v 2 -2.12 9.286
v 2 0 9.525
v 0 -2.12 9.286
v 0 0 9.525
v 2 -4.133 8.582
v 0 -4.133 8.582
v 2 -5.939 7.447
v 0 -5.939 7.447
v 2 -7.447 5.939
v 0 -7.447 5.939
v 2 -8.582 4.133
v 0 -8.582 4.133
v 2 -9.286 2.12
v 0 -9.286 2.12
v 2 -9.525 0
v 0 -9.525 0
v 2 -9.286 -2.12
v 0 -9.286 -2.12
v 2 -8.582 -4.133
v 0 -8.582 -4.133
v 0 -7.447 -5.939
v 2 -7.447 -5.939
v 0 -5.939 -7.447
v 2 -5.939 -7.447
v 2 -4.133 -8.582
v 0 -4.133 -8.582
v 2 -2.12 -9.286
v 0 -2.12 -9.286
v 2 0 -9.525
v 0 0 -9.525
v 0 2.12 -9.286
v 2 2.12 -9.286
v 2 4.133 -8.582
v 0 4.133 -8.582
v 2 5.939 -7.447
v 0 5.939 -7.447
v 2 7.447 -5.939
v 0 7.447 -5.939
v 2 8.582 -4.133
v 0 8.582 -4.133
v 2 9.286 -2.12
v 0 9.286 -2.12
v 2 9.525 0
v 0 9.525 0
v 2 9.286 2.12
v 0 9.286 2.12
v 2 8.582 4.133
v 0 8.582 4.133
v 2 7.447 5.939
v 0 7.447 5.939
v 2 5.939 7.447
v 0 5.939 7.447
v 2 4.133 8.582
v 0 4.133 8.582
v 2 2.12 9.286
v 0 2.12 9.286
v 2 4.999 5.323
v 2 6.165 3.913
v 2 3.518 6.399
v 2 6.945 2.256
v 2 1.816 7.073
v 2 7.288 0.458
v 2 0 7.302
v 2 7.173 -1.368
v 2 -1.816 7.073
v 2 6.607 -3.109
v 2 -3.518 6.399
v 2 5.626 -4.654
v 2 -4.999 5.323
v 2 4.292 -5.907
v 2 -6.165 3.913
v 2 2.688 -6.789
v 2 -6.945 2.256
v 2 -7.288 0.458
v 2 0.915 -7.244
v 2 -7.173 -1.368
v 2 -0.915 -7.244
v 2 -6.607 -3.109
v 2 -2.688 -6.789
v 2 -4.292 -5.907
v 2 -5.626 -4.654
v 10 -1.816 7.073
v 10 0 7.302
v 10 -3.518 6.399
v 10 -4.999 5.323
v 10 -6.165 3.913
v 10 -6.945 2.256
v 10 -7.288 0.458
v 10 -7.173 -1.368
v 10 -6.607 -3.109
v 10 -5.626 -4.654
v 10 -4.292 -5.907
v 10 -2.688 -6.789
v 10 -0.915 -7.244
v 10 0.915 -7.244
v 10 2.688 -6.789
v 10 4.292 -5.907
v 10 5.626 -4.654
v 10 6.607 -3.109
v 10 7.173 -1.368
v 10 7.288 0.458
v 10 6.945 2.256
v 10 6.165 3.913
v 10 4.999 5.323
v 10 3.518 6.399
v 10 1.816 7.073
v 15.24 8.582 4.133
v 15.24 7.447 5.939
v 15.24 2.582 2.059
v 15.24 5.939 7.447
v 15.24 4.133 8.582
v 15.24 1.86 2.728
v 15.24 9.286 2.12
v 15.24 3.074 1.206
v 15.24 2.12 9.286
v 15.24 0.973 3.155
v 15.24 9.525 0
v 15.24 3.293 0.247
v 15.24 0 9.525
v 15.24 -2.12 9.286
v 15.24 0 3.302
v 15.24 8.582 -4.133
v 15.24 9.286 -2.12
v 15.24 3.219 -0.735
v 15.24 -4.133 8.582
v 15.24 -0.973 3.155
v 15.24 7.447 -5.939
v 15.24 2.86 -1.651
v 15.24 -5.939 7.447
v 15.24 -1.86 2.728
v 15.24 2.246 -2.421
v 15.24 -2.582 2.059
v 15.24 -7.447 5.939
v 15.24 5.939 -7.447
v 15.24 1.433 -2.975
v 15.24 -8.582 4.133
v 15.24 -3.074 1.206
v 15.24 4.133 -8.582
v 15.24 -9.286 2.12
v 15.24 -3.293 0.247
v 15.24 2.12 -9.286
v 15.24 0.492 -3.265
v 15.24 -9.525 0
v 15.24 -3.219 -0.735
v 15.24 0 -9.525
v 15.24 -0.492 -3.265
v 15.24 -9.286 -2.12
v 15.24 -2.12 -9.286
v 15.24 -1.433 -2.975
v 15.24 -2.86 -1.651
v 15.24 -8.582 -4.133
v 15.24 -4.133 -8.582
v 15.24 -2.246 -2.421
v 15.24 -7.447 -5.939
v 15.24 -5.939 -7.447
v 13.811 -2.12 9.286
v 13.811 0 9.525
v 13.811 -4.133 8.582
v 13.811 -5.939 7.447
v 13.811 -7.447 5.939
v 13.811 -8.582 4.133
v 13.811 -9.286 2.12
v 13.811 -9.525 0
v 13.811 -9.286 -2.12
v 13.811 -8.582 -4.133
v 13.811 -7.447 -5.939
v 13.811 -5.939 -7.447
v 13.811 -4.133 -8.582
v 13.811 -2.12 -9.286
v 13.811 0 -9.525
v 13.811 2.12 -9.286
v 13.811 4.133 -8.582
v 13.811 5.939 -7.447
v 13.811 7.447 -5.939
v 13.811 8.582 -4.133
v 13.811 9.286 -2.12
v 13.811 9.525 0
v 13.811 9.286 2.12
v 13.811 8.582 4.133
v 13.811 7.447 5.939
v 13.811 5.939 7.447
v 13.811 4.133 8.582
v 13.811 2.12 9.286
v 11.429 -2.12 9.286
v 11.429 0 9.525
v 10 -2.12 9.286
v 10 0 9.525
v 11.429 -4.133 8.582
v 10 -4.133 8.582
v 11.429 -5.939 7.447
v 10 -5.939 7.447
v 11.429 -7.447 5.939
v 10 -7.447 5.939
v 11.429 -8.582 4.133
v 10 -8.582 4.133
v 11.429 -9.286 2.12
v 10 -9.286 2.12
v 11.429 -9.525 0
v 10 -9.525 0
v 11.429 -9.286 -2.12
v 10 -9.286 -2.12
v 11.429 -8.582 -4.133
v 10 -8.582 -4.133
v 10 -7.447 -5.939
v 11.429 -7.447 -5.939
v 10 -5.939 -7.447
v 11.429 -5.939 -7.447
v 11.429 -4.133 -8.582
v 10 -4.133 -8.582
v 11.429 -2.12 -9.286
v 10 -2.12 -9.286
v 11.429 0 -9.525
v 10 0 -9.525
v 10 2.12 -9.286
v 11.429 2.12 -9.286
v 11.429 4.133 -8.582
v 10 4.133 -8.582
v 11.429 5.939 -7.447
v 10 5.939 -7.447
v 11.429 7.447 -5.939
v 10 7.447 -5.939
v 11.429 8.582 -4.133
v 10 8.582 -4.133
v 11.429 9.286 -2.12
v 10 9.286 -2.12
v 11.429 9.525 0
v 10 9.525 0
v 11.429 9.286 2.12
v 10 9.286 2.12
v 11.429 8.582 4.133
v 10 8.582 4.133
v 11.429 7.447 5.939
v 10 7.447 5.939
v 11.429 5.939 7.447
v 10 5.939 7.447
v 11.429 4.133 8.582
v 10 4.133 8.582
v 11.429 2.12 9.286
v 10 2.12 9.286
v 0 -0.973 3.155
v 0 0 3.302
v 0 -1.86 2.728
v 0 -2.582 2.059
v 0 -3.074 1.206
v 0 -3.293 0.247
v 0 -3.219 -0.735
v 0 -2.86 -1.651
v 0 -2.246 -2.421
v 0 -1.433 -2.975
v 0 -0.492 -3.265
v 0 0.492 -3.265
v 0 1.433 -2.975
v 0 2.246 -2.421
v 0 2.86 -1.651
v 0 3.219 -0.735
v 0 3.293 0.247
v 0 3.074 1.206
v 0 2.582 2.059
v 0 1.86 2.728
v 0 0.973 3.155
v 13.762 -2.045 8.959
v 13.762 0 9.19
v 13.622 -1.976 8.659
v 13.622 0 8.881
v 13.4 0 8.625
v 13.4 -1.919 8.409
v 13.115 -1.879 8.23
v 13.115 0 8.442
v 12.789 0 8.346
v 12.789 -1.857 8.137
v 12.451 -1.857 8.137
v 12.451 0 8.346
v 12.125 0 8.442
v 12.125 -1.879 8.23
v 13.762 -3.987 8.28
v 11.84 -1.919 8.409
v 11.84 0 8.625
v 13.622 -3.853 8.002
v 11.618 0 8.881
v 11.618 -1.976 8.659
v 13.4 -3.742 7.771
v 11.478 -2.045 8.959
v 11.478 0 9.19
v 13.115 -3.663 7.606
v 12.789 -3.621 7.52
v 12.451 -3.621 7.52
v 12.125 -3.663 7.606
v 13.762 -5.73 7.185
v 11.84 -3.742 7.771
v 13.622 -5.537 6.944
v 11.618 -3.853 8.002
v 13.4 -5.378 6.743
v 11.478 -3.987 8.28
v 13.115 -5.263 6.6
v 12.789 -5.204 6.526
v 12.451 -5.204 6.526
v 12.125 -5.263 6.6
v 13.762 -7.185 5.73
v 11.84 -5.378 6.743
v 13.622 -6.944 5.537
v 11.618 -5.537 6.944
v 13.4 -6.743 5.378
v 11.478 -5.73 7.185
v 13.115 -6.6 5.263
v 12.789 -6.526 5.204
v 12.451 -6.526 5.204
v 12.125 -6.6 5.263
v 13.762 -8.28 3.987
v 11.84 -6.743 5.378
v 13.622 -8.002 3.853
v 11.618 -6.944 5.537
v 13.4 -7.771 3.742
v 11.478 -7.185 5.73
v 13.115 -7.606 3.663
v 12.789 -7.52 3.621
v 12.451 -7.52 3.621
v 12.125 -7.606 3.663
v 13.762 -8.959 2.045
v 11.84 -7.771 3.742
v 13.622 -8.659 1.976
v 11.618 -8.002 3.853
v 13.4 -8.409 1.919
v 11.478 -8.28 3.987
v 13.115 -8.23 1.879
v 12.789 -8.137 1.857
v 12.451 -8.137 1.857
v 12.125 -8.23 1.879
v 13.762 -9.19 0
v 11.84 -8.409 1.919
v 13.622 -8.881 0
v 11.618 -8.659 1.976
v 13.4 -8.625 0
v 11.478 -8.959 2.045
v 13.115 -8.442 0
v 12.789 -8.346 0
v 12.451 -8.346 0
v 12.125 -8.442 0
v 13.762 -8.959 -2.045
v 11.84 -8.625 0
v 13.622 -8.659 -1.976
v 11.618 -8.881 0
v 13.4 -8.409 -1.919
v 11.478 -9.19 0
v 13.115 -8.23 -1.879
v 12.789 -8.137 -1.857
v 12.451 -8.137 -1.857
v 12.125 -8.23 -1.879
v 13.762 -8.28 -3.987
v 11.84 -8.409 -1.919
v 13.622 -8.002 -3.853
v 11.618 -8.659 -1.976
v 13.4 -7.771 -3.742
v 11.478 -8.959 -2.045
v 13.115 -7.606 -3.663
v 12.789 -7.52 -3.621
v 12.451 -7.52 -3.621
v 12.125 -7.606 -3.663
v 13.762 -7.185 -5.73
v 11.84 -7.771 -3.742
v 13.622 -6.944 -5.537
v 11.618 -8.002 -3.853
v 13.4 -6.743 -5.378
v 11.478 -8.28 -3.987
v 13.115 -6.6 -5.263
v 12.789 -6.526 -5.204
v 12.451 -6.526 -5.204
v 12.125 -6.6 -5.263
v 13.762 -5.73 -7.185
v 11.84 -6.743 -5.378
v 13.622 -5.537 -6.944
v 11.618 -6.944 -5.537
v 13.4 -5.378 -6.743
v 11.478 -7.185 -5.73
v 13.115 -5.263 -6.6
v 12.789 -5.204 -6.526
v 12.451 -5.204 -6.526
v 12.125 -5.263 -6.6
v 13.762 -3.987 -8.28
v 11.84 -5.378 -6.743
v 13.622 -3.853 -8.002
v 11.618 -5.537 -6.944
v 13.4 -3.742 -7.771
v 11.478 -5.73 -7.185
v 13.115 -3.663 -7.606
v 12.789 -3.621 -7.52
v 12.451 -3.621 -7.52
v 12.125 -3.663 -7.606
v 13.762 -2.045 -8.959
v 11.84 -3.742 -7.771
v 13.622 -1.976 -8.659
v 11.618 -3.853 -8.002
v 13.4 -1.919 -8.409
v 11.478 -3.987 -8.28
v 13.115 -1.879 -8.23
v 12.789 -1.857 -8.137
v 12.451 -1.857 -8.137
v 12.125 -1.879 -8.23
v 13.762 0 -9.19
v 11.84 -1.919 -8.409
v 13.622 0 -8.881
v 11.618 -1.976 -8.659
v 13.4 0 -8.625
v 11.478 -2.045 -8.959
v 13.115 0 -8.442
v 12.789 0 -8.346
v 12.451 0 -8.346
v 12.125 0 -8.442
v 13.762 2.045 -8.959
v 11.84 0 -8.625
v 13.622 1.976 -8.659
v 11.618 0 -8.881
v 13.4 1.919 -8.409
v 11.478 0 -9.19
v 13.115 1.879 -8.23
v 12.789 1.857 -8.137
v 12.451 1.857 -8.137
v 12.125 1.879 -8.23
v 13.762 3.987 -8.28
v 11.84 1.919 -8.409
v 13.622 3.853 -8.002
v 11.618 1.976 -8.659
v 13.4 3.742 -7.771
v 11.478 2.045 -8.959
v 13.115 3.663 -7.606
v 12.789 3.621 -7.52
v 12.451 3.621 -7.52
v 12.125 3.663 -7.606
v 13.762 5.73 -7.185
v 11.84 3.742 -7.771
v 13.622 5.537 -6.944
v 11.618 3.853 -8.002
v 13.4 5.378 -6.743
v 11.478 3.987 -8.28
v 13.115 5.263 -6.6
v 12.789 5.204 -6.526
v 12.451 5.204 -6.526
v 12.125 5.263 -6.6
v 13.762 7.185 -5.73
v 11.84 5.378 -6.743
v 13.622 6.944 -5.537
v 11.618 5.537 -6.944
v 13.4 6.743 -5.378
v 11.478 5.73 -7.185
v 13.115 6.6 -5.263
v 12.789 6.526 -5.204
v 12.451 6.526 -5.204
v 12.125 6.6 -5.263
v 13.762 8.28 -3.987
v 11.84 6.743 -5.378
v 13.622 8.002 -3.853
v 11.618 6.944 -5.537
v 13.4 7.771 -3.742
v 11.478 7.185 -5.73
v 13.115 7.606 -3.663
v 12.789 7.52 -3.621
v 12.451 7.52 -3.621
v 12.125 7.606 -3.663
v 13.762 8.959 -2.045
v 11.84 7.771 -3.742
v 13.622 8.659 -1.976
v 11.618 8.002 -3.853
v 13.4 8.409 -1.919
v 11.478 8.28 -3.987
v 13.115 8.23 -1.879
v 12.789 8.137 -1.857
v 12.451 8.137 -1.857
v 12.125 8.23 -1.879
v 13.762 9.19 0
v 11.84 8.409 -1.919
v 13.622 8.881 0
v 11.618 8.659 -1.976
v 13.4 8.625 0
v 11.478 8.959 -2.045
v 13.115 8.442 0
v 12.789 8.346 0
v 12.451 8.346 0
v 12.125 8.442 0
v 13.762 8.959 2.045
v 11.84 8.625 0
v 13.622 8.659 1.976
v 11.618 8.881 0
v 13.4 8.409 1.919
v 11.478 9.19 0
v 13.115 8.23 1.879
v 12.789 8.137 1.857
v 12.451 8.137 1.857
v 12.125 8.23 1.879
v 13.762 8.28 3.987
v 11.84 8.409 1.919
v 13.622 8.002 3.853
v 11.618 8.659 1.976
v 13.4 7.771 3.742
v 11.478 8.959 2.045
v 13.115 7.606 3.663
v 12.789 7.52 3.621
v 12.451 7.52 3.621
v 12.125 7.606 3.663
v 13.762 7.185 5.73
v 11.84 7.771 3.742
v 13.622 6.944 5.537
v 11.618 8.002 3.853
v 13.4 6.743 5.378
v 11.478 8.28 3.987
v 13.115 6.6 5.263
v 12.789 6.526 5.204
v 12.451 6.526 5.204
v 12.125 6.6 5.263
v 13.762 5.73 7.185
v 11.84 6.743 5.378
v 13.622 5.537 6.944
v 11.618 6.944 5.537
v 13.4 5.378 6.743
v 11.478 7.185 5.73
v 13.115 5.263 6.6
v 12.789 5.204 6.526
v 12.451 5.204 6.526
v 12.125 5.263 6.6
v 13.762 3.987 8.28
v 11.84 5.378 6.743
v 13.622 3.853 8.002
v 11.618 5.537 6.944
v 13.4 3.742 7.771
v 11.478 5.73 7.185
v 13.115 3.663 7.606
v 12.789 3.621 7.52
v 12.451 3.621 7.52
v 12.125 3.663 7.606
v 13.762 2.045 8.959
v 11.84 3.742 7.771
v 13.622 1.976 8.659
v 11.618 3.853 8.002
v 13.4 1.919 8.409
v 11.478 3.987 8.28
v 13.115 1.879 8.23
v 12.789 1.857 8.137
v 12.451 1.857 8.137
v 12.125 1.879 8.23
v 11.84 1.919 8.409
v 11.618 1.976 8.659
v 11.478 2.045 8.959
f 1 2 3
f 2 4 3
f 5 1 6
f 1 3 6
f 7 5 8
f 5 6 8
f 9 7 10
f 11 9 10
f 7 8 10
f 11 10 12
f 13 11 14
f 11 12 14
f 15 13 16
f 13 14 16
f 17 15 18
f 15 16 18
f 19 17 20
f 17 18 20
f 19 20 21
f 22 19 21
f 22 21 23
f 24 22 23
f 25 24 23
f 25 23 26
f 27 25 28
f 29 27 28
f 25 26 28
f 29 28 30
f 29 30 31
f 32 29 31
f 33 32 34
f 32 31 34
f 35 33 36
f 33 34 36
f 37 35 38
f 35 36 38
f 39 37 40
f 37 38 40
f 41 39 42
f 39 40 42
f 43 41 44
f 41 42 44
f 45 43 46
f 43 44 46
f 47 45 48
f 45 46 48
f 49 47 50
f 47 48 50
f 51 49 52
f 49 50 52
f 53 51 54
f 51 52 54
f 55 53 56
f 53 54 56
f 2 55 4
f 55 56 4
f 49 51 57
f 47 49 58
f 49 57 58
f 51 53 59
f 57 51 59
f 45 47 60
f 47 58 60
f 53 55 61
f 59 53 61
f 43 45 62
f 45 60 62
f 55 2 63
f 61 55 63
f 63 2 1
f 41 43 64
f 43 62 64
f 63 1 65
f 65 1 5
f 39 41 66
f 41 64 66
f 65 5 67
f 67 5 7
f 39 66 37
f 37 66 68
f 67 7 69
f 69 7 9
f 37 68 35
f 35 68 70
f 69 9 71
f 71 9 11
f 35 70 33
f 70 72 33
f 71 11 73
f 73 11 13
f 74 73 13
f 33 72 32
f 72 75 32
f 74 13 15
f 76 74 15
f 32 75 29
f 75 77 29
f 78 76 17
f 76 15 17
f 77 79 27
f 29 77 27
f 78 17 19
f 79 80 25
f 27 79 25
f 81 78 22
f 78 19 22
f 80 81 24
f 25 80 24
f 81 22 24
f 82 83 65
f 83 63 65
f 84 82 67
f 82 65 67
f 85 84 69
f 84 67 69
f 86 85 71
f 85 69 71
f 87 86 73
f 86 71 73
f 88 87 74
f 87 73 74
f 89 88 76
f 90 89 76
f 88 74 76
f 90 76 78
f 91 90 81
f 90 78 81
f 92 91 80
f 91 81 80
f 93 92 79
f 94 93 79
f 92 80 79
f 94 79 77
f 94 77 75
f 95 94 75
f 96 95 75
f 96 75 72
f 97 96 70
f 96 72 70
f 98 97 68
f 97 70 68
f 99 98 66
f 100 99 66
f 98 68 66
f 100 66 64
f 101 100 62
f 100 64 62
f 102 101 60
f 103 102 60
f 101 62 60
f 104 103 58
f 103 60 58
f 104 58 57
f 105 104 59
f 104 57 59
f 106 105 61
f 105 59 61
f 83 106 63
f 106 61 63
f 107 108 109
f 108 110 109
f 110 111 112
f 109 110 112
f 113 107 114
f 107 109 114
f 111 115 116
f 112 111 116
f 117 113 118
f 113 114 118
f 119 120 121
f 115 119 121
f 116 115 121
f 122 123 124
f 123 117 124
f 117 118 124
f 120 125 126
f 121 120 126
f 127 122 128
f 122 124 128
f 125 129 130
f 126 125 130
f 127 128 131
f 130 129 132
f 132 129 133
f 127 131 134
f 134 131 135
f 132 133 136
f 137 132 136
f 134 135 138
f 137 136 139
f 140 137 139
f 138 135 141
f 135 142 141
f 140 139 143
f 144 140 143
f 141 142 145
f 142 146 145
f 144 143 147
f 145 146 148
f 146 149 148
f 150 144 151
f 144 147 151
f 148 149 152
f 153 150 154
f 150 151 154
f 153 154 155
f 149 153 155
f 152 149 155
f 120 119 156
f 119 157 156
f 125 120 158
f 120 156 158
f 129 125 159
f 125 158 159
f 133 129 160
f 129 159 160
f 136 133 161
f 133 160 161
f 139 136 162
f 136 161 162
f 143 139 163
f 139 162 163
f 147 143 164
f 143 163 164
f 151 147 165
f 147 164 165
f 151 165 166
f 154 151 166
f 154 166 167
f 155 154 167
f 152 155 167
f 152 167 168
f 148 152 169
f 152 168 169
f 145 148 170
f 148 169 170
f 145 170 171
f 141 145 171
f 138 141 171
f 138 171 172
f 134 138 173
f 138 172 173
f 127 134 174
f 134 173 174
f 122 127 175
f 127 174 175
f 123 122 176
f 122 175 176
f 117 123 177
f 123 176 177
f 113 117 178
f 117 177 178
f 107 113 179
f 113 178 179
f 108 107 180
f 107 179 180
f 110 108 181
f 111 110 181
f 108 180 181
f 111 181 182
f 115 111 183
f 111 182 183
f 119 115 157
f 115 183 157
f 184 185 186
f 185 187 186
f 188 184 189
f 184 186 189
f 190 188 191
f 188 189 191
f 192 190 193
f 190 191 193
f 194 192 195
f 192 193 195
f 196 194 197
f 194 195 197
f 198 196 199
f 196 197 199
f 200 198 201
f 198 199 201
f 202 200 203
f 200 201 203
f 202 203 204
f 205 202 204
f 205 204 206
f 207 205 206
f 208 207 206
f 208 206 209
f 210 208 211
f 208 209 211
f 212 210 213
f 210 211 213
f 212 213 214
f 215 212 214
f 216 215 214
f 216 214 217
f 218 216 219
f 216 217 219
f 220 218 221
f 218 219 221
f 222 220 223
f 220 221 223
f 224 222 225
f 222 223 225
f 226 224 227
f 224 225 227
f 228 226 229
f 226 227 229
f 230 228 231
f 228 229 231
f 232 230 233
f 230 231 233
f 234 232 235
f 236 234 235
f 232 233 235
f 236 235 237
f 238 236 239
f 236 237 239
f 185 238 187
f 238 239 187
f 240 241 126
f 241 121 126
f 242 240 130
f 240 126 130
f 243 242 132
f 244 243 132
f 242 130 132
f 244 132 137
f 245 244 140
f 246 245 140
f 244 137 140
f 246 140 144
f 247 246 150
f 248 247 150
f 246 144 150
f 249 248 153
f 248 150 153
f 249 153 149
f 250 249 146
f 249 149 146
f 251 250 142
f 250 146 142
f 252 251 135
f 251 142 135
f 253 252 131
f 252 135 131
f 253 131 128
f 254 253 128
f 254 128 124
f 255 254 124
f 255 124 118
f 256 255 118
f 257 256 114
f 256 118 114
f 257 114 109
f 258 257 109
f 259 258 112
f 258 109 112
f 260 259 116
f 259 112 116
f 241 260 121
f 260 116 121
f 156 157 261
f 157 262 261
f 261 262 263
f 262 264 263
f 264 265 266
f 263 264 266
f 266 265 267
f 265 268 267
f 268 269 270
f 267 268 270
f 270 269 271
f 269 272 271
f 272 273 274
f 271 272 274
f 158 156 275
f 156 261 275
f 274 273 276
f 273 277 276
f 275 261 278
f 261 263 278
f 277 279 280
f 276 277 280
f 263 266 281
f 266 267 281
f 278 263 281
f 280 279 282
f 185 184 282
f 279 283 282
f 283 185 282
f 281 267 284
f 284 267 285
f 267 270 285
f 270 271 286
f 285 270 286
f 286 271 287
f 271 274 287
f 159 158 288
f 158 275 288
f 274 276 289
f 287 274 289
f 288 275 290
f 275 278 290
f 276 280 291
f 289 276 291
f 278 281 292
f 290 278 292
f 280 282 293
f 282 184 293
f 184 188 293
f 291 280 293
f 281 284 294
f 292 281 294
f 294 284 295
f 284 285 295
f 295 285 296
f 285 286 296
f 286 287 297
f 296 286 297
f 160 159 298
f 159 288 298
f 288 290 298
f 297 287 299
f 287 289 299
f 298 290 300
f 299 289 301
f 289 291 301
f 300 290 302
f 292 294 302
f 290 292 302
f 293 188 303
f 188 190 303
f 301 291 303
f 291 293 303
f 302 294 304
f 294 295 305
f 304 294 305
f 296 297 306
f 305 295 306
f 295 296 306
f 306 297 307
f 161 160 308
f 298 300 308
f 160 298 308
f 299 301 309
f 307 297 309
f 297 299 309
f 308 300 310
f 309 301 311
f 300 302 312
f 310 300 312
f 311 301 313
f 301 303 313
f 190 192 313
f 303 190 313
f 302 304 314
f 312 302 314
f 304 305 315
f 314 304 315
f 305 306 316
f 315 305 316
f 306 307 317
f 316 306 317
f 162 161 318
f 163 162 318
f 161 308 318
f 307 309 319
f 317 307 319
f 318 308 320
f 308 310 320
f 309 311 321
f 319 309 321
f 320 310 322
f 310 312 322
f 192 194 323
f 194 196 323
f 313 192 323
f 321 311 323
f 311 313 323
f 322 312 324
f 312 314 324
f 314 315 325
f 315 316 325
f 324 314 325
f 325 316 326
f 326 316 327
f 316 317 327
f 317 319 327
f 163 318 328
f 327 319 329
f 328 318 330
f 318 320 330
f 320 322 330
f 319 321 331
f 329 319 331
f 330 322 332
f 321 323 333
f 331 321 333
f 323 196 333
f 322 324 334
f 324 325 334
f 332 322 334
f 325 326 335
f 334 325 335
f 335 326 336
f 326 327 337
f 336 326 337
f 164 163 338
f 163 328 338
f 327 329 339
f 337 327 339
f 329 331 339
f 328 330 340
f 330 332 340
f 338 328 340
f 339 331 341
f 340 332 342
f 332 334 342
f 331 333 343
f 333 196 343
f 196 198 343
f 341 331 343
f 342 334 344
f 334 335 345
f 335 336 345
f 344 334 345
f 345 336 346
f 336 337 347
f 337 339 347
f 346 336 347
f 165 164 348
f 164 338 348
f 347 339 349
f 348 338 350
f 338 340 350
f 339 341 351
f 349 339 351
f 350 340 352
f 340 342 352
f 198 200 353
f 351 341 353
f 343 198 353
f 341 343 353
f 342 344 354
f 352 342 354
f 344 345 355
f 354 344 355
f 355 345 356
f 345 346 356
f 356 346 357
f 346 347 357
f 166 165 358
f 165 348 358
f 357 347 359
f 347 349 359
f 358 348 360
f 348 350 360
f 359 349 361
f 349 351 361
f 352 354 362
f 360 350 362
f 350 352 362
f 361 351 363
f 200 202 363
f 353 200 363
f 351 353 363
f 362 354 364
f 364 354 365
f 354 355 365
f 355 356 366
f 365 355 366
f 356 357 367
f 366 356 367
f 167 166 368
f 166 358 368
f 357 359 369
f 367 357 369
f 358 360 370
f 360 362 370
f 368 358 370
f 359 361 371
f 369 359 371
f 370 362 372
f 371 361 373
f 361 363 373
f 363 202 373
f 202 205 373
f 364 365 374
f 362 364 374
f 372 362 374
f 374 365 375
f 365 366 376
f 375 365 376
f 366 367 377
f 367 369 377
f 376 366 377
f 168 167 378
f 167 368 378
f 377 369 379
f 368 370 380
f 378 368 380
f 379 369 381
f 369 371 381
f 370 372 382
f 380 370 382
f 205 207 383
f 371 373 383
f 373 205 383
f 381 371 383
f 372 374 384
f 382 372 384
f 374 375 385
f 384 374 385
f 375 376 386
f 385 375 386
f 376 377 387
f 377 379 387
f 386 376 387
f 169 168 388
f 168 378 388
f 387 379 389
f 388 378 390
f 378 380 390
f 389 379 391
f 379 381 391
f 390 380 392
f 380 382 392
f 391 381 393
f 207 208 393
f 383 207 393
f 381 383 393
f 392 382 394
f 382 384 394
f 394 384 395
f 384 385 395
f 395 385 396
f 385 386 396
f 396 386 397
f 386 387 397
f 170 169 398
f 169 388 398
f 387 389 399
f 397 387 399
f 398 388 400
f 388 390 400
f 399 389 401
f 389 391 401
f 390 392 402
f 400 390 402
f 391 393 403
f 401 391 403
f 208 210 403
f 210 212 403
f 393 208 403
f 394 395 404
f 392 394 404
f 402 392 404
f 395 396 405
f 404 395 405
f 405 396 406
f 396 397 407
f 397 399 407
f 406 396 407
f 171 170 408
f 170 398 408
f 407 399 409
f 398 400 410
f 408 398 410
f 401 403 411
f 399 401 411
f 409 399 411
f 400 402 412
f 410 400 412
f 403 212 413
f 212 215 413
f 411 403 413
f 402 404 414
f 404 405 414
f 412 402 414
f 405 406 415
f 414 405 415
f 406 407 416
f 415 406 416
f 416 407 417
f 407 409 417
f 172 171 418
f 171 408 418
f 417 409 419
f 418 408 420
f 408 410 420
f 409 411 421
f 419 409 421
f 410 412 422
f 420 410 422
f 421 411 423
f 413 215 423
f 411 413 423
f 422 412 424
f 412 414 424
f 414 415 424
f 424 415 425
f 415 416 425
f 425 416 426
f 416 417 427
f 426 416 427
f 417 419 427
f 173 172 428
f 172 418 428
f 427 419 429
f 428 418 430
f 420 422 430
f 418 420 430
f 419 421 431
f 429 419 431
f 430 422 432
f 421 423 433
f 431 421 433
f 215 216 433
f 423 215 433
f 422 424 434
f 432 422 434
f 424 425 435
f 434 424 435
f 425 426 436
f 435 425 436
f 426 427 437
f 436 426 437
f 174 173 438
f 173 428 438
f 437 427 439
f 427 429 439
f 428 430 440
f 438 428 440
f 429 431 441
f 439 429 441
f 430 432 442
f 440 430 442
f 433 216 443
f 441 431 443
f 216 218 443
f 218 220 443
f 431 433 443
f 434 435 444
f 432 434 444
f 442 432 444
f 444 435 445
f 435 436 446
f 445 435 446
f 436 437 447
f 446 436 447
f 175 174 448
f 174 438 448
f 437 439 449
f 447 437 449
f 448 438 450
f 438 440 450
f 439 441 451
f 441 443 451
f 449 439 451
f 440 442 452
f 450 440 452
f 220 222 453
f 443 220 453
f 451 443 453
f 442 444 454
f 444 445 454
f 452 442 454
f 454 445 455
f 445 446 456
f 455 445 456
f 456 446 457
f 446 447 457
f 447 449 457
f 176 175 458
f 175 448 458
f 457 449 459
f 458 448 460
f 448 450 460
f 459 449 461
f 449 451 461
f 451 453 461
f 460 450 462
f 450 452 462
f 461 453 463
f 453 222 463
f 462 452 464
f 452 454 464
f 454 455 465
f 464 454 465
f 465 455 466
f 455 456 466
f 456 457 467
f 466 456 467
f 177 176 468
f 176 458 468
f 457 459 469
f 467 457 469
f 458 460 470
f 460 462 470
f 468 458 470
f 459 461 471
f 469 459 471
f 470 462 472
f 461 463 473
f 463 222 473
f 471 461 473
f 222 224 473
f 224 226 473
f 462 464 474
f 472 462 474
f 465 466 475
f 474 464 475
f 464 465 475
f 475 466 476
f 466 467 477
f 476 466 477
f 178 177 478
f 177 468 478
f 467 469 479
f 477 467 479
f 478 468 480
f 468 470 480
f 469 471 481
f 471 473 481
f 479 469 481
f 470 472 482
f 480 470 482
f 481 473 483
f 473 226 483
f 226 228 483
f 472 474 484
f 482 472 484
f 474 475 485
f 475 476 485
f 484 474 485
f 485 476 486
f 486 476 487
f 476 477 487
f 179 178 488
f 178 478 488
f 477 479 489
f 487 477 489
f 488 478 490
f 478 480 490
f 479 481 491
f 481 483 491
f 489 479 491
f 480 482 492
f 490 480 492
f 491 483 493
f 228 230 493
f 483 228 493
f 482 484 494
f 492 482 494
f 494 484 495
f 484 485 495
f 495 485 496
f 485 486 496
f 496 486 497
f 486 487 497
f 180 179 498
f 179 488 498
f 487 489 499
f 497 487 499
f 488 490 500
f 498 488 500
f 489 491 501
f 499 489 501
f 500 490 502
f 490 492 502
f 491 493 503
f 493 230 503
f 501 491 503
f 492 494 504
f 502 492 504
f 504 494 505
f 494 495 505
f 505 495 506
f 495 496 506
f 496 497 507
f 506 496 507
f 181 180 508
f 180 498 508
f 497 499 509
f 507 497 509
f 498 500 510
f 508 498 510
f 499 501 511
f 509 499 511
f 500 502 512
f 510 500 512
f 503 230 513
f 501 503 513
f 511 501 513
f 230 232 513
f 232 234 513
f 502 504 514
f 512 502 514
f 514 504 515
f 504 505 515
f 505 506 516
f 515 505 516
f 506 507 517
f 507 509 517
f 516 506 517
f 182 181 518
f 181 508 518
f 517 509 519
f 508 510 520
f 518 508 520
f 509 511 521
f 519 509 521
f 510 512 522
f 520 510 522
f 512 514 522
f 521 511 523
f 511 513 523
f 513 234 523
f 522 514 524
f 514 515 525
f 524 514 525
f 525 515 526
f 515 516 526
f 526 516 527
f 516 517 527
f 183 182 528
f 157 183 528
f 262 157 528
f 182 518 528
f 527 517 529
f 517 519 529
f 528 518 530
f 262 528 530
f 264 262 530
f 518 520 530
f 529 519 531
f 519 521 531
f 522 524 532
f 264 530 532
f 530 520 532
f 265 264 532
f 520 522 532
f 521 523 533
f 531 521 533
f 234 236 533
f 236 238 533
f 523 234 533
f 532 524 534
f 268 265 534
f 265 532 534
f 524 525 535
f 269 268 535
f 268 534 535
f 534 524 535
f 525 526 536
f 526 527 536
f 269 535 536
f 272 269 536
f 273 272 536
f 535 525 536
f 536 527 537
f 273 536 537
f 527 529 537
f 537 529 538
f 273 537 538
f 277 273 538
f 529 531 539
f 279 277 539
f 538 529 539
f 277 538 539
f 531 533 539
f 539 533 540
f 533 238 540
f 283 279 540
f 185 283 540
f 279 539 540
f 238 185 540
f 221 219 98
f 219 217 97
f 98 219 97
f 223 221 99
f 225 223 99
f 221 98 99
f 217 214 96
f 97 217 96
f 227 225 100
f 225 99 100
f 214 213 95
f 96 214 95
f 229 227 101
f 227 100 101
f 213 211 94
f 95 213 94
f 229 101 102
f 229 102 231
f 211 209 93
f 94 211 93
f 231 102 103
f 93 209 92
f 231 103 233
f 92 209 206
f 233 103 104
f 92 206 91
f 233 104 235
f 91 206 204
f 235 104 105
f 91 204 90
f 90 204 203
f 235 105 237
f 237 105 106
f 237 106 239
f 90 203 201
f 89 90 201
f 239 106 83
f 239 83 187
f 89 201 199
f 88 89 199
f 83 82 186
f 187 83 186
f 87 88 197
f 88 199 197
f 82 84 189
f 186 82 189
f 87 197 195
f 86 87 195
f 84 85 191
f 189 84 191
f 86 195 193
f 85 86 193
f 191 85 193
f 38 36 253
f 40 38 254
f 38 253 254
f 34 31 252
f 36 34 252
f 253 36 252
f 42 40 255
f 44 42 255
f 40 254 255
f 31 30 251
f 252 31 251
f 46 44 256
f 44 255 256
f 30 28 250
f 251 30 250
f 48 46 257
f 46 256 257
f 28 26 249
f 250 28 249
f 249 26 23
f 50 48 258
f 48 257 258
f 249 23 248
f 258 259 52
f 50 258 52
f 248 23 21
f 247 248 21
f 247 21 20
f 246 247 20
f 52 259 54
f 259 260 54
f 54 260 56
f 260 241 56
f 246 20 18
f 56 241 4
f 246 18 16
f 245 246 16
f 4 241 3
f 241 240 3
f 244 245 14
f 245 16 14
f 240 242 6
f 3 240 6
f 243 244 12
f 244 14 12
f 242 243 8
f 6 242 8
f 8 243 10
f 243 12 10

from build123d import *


with BuildPart() as part:
    # Sketch1 → Revolve1 (revolve)
    with BuildSketch(Plane.XY, mode=Mode.PRIVATE) as revolve1_sk:
        with BuildLine():
            Line((0, 3.302), (15.24, 3.302))
            Line((15.24, 3.302), (15.24, 9.525))
            Line((15.24, 9.525), (13.810625, 9.525))
            ThreePointArc((13.810625, 9.525), (12.62, 8.334375), (11.429375, 9.525))
            Line((11.429375, 9.525), (10, 9.525))
            Line((10, 9.525), (10, 7.302))
            Line((10, 7.302), (2, 7.302))
            Line((2, 7.302), (2, 9.525))
            Line((2, 9.525), (0, 9.525))
            Line((0, 9.525), (0, 3.302))
        make_face()
    revolve(revolve1_sk.sketch.rotate(Axis((0, 0, 0), (1, 0, 0)), 90), axis=Axis((0, 0, 0), (1, 0, 0)))


solid = part.part
